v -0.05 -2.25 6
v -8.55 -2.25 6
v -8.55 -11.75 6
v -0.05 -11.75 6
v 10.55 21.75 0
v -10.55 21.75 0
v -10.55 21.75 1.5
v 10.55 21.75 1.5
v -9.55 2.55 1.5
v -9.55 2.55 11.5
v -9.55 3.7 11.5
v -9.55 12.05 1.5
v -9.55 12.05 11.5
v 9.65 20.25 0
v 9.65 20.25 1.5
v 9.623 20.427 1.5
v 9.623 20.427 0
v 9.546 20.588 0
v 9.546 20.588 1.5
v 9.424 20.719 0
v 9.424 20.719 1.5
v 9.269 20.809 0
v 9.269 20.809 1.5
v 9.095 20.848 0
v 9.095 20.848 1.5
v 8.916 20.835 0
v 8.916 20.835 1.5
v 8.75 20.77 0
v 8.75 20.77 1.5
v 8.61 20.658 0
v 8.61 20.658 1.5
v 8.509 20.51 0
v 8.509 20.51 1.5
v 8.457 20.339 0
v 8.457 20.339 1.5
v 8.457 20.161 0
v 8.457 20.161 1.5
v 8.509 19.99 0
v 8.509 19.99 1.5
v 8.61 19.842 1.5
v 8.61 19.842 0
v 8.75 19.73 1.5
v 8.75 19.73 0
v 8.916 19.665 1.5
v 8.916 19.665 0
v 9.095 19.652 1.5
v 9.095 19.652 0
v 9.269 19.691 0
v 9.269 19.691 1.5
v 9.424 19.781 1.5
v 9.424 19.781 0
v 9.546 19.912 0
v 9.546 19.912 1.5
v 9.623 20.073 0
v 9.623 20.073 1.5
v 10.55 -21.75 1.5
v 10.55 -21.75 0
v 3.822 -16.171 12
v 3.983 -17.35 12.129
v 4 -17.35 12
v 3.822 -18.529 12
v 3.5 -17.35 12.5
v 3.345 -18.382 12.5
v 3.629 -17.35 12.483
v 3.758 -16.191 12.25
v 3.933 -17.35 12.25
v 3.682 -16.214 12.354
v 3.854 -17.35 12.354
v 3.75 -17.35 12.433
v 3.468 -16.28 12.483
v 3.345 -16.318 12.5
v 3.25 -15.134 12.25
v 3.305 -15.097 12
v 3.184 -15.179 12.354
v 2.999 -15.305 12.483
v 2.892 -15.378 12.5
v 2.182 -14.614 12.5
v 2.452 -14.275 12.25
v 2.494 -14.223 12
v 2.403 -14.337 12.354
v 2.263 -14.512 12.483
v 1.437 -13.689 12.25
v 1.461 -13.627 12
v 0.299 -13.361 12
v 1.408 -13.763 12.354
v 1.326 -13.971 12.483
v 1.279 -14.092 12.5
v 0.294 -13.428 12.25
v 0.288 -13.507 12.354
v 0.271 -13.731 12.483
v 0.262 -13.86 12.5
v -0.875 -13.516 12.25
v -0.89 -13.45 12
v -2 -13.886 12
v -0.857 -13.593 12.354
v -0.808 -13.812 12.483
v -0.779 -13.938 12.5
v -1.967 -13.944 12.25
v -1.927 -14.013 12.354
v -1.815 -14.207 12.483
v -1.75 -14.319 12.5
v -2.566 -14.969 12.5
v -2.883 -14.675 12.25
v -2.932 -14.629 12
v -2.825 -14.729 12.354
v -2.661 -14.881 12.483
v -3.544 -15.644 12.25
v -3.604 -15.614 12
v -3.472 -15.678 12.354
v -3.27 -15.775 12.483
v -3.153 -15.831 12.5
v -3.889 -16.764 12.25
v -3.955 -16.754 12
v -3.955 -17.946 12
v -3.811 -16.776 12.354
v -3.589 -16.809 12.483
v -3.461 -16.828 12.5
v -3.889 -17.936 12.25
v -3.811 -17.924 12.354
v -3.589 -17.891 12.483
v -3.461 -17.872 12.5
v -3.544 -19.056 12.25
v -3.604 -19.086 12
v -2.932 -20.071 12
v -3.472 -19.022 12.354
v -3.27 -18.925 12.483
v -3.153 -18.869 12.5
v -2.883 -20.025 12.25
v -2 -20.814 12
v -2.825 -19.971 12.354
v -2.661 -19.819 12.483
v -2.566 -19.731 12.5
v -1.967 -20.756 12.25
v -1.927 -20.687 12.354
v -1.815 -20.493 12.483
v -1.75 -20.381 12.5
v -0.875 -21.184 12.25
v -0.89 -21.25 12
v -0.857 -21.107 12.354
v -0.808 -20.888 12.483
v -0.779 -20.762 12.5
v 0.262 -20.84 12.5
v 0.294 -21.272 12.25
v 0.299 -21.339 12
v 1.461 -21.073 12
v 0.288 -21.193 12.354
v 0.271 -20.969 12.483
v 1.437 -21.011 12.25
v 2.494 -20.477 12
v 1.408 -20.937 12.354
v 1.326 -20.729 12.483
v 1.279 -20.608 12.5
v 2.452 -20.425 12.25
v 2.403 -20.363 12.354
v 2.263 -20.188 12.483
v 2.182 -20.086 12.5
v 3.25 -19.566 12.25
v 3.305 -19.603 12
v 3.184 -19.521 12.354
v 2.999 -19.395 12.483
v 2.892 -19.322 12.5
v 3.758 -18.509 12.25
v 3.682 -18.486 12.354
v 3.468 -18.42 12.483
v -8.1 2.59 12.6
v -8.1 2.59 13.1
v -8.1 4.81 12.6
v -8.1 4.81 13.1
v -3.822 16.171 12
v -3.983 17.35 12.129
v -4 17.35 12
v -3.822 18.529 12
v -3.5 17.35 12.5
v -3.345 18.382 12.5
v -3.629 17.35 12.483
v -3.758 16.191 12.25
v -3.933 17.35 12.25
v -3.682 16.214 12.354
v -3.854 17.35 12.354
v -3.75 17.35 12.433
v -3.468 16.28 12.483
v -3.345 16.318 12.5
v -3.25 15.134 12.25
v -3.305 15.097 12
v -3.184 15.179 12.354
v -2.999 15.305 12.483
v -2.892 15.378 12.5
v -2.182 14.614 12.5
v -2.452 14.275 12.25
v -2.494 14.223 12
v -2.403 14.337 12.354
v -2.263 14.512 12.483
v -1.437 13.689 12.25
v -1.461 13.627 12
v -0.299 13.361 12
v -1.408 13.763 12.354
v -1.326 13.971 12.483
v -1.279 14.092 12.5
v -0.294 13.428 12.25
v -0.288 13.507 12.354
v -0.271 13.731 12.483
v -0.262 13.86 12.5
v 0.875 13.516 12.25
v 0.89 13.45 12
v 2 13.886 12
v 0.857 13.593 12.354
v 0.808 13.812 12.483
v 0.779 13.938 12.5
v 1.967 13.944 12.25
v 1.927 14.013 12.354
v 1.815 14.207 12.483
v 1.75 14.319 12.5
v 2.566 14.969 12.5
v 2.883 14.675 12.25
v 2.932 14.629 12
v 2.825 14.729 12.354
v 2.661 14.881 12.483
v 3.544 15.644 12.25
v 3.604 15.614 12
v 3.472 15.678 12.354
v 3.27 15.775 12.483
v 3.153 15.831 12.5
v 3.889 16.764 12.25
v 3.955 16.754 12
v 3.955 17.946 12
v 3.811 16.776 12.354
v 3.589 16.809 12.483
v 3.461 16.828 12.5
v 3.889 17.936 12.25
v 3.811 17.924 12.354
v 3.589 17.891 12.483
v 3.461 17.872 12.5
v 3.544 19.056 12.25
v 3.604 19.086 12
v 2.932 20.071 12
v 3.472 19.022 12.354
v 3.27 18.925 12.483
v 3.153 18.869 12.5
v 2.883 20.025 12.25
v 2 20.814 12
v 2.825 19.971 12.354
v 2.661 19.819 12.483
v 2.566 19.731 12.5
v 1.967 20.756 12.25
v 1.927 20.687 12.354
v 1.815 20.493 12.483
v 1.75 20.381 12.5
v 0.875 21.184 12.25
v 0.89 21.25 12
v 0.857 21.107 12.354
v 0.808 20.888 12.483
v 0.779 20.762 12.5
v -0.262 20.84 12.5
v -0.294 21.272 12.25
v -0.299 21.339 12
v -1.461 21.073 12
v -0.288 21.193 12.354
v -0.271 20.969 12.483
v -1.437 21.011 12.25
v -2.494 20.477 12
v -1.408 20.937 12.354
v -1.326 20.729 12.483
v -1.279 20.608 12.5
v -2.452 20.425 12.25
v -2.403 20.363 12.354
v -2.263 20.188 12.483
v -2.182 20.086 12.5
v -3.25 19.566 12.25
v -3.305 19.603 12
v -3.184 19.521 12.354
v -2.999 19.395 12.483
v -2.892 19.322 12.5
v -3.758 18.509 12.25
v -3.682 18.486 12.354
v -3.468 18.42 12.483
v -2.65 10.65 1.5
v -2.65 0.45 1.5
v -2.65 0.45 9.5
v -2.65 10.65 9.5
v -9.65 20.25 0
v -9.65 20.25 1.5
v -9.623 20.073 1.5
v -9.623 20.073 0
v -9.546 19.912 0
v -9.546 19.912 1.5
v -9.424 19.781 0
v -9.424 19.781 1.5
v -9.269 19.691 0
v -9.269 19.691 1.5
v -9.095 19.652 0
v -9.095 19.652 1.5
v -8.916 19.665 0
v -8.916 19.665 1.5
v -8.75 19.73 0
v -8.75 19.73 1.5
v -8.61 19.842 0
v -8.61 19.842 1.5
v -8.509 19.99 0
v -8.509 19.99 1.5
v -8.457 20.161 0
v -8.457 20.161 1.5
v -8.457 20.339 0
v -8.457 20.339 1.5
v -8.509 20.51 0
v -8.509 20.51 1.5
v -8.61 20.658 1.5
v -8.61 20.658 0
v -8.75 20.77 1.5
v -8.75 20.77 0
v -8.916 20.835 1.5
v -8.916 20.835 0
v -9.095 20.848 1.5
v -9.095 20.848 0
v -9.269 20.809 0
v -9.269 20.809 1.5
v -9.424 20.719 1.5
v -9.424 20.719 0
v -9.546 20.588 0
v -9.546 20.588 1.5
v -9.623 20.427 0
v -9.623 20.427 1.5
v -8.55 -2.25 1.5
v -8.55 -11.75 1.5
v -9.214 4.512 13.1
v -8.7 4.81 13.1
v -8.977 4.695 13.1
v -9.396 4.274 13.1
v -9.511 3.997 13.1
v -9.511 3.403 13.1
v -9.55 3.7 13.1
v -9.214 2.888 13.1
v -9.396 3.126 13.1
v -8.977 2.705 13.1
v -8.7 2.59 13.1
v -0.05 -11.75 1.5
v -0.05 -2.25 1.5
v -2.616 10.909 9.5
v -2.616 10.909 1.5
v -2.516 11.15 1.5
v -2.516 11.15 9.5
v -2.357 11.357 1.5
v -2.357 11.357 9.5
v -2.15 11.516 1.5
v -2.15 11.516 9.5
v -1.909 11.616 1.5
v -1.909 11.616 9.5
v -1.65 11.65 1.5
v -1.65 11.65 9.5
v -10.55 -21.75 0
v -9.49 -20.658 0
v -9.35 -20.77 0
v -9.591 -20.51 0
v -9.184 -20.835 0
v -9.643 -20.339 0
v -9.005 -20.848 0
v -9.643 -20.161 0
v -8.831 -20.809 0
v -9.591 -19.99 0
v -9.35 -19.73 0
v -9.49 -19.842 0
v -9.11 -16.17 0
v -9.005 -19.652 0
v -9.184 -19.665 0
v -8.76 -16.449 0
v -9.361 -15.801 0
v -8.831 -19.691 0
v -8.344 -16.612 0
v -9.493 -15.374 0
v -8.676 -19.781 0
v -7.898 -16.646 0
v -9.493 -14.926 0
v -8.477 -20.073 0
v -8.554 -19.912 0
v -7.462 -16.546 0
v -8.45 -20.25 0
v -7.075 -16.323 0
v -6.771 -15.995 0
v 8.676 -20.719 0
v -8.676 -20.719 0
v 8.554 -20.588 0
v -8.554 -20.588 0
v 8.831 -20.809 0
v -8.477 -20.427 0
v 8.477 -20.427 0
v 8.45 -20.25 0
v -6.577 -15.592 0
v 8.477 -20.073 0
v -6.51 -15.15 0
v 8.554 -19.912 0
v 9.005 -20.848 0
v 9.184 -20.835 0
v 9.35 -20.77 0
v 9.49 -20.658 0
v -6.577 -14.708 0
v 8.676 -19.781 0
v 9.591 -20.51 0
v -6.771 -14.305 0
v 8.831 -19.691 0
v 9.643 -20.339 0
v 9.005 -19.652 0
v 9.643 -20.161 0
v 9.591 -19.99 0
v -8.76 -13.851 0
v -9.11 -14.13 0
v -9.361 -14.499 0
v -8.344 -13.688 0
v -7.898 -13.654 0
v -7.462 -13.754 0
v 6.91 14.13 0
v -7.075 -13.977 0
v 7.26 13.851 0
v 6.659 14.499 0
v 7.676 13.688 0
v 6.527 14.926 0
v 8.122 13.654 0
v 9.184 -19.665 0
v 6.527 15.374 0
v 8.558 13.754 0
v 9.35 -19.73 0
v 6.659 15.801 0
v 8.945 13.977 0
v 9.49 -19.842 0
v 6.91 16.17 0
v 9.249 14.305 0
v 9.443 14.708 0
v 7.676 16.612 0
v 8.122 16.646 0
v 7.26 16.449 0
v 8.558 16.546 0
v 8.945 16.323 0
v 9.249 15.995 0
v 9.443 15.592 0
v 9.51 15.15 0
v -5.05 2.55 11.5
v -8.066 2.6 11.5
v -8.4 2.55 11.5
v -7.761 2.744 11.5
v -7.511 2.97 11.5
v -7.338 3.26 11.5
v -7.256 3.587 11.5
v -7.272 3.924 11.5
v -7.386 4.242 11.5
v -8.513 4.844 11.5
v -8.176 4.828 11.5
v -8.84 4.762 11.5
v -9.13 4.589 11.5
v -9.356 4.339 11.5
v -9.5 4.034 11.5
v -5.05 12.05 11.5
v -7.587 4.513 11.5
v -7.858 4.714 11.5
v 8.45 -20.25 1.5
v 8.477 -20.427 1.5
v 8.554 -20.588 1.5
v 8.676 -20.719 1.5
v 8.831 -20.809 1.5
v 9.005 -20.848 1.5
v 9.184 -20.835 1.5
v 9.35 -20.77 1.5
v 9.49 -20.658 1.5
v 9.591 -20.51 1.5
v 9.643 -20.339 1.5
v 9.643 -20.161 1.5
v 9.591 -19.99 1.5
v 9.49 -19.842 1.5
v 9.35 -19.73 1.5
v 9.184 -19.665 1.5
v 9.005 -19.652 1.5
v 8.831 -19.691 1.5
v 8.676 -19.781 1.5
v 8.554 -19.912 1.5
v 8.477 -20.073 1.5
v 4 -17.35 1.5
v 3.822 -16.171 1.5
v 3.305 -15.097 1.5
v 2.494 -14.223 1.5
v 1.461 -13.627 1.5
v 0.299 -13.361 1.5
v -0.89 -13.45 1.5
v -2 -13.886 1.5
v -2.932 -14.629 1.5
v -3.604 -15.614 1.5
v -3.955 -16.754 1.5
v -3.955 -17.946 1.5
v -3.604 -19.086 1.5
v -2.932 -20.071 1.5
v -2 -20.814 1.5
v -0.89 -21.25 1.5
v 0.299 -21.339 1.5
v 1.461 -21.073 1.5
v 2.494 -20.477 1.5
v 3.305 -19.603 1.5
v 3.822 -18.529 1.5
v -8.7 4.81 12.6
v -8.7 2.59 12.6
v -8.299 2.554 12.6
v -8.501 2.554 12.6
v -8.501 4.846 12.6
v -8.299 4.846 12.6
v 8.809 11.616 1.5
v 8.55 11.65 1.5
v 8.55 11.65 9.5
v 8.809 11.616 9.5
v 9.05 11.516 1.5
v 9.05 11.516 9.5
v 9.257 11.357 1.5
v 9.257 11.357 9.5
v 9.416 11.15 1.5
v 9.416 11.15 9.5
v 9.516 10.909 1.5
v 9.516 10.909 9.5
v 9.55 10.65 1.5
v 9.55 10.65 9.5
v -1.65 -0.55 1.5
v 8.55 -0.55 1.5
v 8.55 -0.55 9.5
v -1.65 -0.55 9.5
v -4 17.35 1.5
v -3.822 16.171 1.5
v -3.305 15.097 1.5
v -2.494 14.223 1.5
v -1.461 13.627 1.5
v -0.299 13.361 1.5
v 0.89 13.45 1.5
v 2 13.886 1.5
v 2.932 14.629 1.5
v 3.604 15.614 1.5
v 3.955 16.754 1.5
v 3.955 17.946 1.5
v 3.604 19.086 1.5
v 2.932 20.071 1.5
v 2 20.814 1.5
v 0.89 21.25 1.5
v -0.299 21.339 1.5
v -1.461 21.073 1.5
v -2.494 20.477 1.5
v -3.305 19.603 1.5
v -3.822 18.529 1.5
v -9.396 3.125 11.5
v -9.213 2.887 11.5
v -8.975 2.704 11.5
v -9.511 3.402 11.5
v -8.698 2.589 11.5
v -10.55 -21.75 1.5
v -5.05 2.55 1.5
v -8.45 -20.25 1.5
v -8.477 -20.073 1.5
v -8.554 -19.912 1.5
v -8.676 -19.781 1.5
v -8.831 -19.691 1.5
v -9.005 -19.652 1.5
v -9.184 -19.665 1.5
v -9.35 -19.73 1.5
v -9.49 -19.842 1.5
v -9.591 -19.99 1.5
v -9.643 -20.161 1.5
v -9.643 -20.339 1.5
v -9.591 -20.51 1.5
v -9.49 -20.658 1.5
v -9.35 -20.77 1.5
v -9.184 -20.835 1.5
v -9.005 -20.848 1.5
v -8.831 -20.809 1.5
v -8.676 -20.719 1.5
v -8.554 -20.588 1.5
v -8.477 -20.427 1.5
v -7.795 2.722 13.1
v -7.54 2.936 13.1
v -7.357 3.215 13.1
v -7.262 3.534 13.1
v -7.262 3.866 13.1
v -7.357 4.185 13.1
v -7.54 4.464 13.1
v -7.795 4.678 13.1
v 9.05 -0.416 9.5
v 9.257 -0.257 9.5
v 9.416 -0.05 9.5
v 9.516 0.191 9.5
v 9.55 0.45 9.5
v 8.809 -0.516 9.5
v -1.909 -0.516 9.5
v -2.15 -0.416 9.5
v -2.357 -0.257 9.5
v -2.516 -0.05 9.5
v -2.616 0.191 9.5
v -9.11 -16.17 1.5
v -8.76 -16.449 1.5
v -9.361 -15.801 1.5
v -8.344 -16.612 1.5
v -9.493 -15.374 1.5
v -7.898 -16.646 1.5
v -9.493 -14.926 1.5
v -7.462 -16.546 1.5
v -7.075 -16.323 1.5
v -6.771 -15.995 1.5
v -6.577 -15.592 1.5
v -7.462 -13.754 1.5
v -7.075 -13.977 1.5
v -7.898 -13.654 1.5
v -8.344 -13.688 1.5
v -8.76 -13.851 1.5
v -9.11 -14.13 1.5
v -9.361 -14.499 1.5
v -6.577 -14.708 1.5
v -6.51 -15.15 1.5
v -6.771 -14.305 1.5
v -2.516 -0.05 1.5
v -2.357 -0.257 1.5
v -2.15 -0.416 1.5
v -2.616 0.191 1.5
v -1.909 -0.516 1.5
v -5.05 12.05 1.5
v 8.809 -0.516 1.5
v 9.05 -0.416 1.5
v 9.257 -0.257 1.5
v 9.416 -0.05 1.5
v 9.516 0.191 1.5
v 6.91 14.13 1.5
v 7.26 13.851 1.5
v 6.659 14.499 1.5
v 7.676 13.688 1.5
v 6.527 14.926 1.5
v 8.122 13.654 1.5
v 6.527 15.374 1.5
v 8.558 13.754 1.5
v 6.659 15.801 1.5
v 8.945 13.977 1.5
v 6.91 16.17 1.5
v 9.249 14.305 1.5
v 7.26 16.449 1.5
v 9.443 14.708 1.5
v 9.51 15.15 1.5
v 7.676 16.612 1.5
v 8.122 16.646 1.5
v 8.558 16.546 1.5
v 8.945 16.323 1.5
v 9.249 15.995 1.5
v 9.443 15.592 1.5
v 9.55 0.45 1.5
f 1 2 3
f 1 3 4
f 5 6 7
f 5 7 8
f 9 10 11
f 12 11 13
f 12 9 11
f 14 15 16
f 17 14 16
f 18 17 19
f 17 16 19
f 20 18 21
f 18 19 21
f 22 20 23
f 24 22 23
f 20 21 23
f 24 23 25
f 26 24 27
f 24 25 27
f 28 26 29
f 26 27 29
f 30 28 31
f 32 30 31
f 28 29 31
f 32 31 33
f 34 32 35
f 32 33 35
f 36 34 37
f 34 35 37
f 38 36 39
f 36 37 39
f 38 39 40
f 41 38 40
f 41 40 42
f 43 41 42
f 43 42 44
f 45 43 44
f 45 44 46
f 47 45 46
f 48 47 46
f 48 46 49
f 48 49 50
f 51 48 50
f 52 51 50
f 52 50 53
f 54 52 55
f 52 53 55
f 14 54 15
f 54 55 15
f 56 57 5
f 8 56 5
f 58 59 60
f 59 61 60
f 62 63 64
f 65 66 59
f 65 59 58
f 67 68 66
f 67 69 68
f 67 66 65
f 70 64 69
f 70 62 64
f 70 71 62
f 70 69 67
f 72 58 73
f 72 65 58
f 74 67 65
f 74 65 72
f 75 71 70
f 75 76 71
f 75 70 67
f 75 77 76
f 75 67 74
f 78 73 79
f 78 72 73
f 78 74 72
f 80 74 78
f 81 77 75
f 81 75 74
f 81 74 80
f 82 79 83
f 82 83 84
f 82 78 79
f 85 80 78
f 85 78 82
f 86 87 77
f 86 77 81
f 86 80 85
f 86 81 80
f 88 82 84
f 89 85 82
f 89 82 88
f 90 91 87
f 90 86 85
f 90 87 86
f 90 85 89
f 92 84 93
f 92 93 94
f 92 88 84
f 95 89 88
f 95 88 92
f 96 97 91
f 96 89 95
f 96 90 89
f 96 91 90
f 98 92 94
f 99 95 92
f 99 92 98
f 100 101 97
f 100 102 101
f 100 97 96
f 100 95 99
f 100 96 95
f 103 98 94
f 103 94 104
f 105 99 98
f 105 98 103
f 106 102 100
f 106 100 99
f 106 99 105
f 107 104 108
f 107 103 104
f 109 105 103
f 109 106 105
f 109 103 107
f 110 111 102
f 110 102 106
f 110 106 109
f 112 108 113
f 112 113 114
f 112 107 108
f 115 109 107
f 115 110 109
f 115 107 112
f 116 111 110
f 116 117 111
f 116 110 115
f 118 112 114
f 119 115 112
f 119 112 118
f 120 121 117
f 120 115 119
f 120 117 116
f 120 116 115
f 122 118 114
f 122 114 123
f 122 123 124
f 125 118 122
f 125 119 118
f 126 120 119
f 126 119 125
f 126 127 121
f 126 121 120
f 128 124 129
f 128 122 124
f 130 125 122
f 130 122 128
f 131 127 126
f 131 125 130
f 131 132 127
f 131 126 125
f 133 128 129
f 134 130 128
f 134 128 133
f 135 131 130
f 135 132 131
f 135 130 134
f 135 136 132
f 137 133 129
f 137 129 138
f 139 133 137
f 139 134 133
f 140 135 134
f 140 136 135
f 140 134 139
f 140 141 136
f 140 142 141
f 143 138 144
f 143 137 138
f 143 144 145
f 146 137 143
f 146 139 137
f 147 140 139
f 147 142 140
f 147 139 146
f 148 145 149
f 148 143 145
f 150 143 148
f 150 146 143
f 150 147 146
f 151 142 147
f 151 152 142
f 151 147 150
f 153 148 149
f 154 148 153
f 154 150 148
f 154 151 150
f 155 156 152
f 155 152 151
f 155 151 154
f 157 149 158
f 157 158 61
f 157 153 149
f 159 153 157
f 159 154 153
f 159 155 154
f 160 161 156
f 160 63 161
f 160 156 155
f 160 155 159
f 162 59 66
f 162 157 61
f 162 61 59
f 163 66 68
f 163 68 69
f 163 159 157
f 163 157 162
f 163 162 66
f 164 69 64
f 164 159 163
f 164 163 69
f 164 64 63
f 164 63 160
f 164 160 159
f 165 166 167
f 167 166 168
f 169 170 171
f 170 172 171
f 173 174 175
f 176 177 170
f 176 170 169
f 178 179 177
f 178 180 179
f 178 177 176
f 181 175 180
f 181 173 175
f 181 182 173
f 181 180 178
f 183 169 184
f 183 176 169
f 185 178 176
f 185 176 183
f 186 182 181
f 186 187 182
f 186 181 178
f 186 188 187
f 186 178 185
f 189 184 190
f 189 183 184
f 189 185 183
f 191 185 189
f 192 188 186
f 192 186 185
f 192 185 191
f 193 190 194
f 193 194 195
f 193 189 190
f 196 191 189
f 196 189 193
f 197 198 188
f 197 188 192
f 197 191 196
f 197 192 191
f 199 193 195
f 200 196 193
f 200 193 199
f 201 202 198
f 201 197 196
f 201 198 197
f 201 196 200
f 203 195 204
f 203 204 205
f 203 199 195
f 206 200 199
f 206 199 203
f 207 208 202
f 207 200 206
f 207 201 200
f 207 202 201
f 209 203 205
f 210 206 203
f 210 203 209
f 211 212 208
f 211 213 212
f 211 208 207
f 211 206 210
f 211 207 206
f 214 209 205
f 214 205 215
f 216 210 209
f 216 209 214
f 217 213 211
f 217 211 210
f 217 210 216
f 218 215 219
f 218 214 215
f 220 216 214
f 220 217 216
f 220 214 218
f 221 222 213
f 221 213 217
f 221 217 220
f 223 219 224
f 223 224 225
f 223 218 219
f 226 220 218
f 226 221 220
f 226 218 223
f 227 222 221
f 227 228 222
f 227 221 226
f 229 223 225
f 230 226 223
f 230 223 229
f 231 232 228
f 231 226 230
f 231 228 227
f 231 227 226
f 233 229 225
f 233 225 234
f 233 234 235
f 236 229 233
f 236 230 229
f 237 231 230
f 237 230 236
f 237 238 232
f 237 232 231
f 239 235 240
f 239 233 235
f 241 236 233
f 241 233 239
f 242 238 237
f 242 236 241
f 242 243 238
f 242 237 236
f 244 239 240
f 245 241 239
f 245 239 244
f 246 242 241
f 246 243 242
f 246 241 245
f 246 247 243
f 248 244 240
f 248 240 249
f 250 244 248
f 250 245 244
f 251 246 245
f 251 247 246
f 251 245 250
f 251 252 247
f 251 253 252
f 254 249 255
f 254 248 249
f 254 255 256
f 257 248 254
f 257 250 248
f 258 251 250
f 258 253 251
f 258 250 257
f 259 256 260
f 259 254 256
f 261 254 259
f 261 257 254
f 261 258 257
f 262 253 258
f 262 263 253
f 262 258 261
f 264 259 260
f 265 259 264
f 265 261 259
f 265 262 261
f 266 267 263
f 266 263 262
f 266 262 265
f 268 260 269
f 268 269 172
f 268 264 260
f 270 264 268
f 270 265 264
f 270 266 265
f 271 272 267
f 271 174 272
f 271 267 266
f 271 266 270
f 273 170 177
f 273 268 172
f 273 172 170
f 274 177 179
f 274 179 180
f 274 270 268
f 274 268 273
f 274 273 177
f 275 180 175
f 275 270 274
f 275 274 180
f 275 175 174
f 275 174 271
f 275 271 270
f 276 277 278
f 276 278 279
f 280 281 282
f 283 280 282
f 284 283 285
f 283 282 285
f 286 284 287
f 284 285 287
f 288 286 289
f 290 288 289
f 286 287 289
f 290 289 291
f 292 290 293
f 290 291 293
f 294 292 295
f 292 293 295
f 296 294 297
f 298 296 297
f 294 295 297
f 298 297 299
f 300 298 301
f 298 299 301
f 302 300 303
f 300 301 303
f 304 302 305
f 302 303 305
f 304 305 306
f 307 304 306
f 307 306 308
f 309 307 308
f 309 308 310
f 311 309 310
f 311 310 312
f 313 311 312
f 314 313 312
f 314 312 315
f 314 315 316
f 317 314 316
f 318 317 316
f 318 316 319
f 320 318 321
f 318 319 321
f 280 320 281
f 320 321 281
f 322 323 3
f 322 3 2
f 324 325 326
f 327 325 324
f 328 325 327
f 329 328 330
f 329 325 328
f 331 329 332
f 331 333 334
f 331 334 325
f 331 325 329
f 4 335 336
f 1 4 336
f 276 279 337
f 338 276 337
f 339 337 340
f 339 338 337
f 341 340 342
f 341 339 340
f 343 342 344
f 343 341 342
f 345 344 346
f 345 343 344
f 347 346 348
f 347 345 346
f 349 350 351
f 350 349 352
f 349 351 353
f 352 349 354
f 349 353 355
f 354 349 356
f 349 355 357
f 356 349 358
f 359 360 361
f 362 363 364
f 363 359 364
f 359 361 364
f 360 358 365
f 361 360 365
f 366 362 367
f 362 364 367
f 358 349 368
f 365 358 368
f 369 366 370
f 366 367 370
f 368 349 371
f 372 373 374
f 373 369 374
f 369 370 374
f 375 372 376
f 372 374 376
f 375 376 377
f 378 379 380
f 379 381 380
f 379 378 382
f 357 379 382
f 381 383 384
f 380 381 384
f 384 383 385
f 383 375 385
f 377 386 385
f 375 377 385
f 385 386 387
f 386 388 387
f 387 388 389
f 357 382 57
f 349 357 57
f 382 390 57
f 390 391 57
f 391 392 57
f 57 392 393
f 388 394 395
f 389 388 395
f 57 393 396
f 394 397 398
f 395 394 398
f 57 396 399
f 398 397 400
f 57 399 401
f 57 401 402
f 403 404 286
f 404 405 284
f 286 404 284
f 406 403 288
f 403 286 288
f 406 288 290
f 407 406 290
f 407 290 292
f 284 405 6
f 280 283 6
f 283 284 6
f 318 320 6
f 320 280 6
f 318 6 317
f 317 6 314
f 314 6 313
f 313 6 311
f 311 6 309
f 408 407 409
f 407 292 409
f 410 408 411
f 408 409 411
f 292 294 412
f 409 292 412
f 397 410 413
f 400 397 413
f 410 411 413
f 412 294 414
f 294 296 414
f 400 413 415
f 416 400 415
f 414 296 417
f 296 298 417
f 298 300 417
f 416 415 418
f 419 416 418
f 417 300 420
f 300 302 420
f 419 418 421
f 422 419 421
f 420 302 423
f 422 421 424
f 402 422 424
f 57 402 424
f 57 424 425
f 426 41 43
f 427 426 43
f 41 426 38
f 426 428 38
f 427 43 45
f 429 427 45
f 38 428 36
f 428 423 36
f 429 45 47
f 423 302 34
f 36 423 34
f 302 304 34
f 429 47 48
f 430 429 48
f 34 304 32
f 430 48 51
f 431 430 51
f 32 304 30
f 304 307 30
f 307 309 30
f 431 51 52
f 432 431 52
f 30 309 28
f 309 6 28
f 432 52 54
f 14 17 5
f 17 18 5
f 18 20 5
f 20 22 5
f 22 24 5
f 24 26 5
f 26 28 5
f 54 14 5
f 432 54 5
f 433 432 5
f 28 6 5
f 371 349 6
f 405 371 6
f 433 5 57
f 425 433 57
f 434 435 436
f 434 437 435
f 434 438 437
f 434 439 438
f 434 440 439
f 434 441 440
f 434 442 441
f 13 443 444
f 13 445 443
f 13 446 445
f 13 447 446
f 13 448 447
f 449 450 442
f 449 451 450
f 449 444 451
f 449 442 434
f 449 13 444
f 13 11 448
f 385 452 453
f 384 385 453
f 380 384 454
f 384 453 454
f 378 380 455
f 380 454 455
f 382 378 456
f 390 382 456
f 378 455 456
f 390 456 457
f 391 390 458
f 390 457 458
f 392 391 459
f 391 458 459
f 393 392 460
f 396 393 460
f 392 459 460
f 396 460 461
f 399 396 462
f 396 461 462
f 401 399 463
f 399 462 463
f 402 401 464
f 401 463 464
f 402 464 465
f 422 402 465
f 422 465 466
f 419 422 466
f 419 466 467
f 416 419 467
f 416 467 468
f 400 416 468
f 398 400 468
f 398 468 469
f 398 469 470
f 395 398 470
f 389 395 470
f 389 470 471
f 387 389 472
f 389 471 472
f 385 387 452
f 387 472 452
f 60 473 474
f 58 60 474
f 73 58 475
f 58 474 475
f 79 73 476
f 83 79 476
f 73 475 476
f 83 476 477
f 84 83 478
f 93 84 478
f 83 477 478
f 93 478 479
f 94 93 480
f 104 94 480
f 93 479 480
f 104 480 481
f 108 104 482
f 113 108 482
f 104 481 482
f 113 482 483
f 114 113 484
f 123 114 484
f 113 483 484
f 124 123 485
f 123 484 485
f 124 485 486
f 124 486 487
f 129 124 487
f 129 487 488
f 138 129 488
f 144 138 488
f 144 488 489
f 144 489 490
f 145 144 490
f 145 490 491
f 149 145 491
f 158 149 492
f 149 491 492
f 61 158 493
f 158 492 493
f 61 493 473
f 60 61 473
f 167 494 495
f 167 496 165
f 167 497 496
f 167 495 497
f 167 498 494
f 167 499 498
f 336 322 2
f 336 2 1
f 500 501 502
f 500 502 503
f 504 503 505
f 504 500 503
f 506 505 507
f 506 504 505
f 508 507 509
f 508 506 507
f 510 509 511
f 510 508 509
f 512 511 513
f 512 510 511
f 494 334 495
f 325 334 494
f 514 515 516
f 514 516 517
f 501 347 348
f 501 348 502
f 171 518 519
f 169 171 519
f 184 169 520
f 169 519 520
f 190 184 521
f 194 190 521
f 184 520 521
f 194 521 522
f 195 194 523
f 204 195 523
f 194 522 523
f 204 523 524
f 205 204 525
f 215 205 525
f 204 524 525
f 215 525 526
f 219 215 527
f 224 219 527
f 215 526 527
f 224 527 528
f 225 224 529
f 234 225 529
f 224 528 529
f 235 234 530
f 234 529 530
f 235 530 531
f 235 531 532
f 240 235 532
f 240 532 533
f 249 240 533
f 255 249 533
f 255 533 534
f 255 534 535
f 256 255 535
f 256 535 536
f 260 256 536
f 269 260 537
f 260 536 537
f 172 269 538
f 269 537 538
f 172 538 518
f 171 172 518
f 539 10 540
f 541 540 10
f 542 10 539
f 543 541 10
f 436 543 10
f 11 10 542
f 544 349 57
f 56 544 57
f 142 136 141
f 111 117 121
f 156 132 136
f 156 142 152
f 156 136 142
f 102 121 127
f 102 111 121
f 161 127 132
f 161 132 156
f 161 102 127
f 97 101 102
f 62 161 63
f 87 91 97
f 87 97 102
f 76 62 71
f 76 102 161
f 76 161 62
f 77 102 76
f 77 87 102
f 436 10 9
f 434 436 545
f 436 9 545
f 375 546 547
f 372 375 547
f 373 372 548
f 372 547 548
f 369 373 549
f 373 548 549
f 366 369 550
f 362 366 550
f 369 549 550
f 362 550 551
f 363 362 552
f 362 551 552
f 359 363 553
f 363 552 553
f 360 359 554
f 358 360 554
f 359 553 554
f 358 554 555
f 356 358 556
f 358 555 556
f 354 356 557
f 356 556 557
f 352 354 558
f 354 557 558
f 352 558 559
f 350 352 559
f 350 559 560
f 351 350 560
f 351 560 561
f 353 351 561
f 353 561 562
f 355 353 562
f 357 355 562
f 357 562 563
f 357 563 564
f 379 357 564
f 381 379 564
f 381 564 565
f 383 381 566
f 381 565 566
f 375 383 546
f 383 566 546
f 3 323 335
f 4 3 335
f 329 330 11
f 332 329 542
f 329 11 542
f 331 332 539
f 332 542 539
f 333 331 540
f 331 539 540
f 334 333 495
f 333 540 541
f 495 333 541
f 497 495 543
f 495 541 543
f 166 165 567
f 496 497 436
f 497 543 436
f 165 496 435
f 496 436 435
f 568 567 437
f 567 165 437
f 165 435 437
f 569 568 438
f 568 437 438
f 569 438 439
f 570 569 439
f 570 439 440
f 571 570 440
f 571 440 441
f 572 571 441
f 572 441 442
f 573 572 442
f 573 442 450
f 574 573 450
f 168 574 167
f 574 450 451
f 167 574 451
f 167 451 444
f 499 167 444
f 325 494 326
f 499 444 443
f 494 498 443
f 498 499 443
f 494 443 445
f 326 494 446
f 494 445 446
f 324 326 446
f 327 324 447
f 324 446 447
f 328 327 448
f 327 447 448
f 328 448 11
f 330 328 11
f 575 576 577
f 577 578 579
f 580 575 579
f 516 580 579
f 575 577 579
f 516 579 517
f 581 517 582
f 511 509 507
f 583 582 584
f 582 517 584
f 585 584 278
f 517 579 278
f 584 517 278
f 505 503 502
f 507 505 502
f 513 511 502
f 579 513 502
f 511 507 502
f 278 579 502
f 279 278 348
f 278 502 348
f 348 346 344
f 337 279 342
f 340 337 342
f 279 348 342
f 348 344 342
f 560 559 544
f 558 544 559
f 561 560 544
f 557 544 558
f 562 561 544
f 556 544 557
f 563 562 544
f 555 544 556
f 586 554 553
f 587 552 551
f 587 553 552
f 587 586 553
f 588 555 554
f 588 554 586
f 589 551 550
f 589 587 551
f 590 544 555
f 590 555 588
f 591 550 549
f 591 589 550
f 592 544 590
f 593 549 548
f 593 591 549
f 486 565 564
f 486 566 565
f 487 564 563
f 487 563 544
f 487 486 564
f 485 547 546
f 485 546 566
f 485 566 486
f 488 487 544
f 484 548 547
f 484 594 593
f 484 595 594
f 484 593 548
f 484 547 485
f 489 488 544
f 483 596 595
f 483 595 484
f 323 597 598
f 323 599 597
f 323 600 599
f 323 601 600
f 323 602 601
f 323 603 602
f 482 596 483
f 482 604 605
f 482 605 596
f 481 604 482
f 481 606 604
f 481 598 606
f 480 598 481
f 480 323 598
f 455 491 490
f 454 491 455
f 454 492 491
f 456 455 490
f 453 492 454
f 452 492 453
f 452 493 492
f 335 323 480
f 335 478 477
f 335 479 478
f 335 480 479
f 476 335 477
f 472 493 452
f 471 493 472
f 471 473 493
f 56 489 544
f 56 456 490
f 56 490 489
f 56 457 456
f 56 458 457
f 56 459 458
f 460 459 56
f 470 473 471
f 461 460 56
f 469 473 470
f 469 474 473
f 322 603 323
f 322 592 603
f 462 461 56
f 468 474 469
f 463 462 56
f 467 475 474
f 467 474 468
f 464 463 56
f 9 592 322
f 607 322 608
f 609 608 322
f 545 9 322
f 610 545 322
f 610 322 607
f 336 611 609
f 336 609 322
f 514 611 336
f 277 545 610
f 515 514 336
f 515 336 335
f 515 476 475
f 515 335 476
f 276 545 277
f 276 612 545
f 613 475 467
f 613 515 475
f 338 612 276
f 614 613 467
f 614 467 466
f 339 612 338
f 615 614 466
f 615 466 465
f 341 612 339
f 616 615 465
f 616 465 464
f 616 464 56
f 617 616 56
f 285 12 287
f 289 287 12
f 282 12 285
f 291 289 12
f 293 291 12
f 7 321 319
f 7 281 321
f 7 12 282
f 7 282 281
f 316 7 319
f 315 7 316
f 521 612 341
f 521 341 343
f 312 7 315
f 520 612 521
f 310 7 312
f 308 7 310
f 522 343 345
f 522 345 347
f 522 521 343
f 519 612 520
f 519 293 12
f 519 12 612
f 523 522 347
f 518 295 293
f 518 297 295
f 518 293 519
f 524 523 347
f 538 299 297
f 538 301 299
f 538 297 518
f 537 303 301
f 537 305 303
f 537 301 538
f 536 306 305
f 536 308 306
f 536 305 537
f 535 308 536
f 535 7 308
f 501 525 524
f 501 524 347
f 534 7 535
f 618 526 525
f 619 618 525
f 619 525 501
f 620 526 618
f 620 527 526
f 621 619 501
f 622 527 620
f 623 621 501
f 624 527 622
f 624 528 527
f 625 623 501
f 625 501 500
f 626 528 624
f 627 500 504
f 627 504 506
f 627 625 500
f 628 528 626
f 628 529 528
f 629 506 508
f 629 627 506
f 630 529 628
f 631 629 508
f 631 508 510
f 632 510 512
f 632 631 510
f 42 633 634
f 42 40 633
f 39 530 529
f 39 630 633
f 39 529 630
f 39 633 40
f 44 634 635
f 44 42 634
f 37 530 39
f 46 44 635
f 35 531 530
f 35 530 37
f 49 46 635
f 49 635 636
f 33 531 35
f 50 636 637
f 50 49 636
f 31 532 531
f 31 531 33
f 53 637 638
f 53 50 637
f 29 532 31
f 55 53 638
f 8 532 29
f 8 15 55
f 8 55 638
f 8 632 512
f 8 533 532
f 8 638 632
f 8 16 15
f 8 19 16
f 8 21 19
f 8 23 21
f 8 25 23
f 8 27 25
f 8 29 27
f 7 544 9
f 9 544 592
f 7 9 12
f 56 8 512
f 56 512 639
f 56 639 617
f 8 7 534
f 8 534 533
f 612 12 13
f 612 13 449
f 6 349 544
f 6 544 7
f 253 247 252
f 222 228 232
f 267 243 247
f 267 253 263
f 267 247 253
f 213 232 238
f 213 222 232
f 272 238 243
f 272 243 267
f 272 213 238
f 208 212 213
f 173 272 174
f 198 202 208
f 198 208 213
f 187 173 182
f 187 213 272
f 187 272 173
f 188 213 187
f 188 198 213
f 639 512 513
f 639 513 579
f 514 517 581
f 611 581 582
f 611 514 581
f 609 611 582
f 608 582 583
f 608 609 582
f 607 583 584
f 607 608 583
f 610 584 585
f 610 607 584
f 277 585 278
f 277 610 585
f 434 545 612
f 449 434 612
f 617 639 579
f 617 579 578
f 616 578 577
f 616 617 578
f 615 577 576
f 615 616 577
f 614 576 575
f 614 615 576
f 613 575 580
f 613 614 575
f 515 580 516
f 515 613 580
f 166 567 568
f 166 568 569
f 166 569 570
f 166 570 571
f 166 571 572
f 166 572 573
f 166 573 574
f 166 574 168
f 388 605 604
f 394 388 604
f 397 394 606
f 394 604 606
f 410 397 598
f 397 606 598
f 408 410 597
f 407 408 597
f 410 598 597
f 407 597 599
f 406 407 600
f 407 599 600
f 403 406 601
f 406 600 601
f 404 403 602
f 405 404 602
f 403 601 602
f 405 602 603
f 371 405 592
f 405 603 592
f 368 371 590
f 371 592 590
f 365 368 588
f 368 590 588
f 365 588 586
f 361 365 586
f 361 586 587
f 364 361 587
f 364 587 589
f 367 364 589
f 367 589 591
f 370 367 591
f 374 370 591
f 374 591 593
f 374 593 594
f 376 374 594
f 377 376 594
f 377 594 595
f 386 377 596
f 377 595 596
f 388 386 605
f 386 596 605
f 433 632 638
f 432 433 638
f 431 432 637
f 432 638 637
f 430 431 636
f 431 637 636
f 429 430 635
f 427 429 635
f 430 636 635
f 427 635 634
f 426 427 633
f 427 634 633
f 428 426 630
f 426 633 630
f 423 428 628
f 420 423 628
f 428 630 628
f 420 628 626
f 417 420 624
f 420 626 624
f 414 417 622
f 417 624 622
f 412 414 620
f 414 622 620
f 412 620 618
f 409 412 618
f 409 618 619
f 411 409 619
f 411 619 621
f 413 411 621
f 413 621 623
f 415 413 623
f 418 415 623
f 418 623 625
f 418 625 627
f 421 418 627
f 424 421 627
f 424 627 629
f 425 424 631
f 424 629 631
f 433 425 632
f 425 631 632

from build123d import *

# Parameters (mm, degrees)
SKETCH_1_W          = 21.1
SKETCH_1_H          = 43.5
EXTRUDE_1_DEPTH     = 1.5
SKETCH_6_R          = 1.5
SKETCH_6_R_2        = 0.6
CUT_EXTRUDE_2_DEPTH = 1.5
SKETCH_7_R          = 4
EXTRUDE_9_DEPTH     = 11
EXTRUDE_10_DEPTH    = 8
SKETCH_7_4_W        = 8.5
SKETCH_7_4_H        = 9.5
EXTRUDE_11_DEPTH    = 4.5
FILLET_1_R          = 0.5
SKETCH_4_3_W        = 4.5
SKETCH_4_3_H        = 9.5
EXTRUDE_7_DEPTH     = 10
EXTRUDE_START       = 10
SKETCH_4_3_3_R      = 1.15
EXTRUDE_8_DEPTH     = 1.6
SKETCH_5_W          = 0.6
SKETCH_5_H          = 3
CUT_EXTRUDE_1_DEPTH = 0.5


with BuildPart() as part:
    # Эскиз1 → Бобышка-Вытянуть1 (new body)
    with BuildSketch(Plane.XY):
        Rectangle(SKETCH_1_W, SKETCH_1_H)
    extrude(amount=EXTRUDE_1_DEPTH)

    # Эскиз6 → Вырез-Вытянуть2 (cut)
    with BuildSketch(Plane.XY.offset(1.5)):
        with Locations((8.01, 15.15)):
            Circle(SKETCH_6_R)
        with Locations((-8.01, -15.15)):
            Circle(SKETCH_6_R)
        with Locations((9.05, 20.25)):
            Circle(SKETCH_6_R_2)
        with Locations(Location((-9.05, 20.25, 0), (0, 0, 180))):
            Circle(SKETCH_6_R_2)
        with Locations(Location((9.05, -20.25, 0), (0, 0, 180))):
            Circle(SKETCH_6_R_2)
        with Locations((-9.05, -20.25)):
            Circle(SKETCH_6_R_2)
    extrude(amount=-CUT_EXTRUDE_2_DEPTH, mode=Mode.SUBTRACT)

    # Эскиз7 → Бобышка-Вытянуть9 (add)
    with BuildSketch(Plane.XY.offset(1.5)):
        with Locations(Location((0, 17.35, 0), (0, 0, 180))):
            Circle(SKETCH_7_R)
        with Locations((0, -17.35)):
            Circle(SKETCH_7_R)
    extrude(amount=EXTRUDE_9_DEPTH)

    # Эскиз7<3> → Бобышка-Вытянуть10 (add)
    with BuildSketch(Plane.XY.offset(1.5)):
        with BuildLine():
            ThreePointArc((8.55, 11.65), (9.257106781, 11.357106781), (9.55, 10.65))
            Line((9.55, 10.65), (9.55, 0.45))
            ThreePointArc((9.55, 0.45), (9.257106781, -0.257106781), (8.55, -0.55))
            Line((8.55, -0.55), (-1.65, -0.55))
            ThreePointArc((-1.65, -0.55), (-2.357106781, -0.257106781), (-2.65, 0.45))
            Line((-2.65, 0.45), (-2.65, 10.65))
            ThreePointArc((-2.65, 10.65), (-2.357106781, 11.357106781), (-1.65, 11.65))
            Line((-1.65, 11.65), (8.55, 11.65))
        make_face()
    extrude(amount=EXTRUDE_10_DEPTH)

    # Эскиз7<4> → Бобышка-Вытянуть11 (add)
    with BuildSketch(Plane.XY.offset(1.5)):
        with Locations((-4.3, -7)):
            Rectangle(SKETCH_7_4_W, SKETCH_7_4_H)
    extrude(amount=EXTRUDE_11_DEPTH)

    # Скругление1
    fillet_1_edges = [part.edges().sort_by_distance(p)[0] for p in [
        (4, 17.35, 12.5),
        (-4, -17.35, 12.5),
    ]]
    fillet(fillet_1_edges, radius=FILLET_1_R)



with BuildPart() as body_2:
    # Эскиз4<3> → Бобышка-Вытянуть7 (new body)
    with BuildSketch(Plane(origin=(5.475455411, 30.634305543, 1.5), x_dir=(1, 0, 0), z_dir=(0, 0, 1))):
        with Locations((-12.775455411, -23.334305543)):
            Rectangle(SKETCH_4_3_W, SKETCH_4_3_H)
    extrude(amount=EXTRUDE_7_DEPTH)


with BuildPart() as part_1:
    add(part.part)

    add(body_2.part)  # Бобышка-Вытянуть8 merges body 2
    # Эскиз4<3><3> → Бобышка-Вытянуть8 (add)
    with BuildSketch(Plane(origin=(5.475455411, 30.634305543, 1.5), x_dir=(1, 0, 0), z_dir=(0, 0, 1)).offset(EXTRUDE_START)):
        with Locations(Location((-13.875455411, -26.934305543, 0), (0, 0, 180))):
            Circle(SKETCH_4_3_3_R)
    extrude(amount=EXTRUDE_8_DEPTH)

    # Эскиз5 → Вырез-Вытянуть1 (cut)
    with BuildSketch(Plane(origin=(6.95, -7.75, 13.1), x_dir=(1, 0, 0), z_dir=(0, 0, 1))):
        with Locations((-15.35, 11.45)):
            Rectangle(SKETCH_5_W, SKETCH_5_H)
    extrude(amount=-CUT_EXTRUDE_1_DEPTH, mode=Mode.SUBTRACT)


solid = part_1.part
